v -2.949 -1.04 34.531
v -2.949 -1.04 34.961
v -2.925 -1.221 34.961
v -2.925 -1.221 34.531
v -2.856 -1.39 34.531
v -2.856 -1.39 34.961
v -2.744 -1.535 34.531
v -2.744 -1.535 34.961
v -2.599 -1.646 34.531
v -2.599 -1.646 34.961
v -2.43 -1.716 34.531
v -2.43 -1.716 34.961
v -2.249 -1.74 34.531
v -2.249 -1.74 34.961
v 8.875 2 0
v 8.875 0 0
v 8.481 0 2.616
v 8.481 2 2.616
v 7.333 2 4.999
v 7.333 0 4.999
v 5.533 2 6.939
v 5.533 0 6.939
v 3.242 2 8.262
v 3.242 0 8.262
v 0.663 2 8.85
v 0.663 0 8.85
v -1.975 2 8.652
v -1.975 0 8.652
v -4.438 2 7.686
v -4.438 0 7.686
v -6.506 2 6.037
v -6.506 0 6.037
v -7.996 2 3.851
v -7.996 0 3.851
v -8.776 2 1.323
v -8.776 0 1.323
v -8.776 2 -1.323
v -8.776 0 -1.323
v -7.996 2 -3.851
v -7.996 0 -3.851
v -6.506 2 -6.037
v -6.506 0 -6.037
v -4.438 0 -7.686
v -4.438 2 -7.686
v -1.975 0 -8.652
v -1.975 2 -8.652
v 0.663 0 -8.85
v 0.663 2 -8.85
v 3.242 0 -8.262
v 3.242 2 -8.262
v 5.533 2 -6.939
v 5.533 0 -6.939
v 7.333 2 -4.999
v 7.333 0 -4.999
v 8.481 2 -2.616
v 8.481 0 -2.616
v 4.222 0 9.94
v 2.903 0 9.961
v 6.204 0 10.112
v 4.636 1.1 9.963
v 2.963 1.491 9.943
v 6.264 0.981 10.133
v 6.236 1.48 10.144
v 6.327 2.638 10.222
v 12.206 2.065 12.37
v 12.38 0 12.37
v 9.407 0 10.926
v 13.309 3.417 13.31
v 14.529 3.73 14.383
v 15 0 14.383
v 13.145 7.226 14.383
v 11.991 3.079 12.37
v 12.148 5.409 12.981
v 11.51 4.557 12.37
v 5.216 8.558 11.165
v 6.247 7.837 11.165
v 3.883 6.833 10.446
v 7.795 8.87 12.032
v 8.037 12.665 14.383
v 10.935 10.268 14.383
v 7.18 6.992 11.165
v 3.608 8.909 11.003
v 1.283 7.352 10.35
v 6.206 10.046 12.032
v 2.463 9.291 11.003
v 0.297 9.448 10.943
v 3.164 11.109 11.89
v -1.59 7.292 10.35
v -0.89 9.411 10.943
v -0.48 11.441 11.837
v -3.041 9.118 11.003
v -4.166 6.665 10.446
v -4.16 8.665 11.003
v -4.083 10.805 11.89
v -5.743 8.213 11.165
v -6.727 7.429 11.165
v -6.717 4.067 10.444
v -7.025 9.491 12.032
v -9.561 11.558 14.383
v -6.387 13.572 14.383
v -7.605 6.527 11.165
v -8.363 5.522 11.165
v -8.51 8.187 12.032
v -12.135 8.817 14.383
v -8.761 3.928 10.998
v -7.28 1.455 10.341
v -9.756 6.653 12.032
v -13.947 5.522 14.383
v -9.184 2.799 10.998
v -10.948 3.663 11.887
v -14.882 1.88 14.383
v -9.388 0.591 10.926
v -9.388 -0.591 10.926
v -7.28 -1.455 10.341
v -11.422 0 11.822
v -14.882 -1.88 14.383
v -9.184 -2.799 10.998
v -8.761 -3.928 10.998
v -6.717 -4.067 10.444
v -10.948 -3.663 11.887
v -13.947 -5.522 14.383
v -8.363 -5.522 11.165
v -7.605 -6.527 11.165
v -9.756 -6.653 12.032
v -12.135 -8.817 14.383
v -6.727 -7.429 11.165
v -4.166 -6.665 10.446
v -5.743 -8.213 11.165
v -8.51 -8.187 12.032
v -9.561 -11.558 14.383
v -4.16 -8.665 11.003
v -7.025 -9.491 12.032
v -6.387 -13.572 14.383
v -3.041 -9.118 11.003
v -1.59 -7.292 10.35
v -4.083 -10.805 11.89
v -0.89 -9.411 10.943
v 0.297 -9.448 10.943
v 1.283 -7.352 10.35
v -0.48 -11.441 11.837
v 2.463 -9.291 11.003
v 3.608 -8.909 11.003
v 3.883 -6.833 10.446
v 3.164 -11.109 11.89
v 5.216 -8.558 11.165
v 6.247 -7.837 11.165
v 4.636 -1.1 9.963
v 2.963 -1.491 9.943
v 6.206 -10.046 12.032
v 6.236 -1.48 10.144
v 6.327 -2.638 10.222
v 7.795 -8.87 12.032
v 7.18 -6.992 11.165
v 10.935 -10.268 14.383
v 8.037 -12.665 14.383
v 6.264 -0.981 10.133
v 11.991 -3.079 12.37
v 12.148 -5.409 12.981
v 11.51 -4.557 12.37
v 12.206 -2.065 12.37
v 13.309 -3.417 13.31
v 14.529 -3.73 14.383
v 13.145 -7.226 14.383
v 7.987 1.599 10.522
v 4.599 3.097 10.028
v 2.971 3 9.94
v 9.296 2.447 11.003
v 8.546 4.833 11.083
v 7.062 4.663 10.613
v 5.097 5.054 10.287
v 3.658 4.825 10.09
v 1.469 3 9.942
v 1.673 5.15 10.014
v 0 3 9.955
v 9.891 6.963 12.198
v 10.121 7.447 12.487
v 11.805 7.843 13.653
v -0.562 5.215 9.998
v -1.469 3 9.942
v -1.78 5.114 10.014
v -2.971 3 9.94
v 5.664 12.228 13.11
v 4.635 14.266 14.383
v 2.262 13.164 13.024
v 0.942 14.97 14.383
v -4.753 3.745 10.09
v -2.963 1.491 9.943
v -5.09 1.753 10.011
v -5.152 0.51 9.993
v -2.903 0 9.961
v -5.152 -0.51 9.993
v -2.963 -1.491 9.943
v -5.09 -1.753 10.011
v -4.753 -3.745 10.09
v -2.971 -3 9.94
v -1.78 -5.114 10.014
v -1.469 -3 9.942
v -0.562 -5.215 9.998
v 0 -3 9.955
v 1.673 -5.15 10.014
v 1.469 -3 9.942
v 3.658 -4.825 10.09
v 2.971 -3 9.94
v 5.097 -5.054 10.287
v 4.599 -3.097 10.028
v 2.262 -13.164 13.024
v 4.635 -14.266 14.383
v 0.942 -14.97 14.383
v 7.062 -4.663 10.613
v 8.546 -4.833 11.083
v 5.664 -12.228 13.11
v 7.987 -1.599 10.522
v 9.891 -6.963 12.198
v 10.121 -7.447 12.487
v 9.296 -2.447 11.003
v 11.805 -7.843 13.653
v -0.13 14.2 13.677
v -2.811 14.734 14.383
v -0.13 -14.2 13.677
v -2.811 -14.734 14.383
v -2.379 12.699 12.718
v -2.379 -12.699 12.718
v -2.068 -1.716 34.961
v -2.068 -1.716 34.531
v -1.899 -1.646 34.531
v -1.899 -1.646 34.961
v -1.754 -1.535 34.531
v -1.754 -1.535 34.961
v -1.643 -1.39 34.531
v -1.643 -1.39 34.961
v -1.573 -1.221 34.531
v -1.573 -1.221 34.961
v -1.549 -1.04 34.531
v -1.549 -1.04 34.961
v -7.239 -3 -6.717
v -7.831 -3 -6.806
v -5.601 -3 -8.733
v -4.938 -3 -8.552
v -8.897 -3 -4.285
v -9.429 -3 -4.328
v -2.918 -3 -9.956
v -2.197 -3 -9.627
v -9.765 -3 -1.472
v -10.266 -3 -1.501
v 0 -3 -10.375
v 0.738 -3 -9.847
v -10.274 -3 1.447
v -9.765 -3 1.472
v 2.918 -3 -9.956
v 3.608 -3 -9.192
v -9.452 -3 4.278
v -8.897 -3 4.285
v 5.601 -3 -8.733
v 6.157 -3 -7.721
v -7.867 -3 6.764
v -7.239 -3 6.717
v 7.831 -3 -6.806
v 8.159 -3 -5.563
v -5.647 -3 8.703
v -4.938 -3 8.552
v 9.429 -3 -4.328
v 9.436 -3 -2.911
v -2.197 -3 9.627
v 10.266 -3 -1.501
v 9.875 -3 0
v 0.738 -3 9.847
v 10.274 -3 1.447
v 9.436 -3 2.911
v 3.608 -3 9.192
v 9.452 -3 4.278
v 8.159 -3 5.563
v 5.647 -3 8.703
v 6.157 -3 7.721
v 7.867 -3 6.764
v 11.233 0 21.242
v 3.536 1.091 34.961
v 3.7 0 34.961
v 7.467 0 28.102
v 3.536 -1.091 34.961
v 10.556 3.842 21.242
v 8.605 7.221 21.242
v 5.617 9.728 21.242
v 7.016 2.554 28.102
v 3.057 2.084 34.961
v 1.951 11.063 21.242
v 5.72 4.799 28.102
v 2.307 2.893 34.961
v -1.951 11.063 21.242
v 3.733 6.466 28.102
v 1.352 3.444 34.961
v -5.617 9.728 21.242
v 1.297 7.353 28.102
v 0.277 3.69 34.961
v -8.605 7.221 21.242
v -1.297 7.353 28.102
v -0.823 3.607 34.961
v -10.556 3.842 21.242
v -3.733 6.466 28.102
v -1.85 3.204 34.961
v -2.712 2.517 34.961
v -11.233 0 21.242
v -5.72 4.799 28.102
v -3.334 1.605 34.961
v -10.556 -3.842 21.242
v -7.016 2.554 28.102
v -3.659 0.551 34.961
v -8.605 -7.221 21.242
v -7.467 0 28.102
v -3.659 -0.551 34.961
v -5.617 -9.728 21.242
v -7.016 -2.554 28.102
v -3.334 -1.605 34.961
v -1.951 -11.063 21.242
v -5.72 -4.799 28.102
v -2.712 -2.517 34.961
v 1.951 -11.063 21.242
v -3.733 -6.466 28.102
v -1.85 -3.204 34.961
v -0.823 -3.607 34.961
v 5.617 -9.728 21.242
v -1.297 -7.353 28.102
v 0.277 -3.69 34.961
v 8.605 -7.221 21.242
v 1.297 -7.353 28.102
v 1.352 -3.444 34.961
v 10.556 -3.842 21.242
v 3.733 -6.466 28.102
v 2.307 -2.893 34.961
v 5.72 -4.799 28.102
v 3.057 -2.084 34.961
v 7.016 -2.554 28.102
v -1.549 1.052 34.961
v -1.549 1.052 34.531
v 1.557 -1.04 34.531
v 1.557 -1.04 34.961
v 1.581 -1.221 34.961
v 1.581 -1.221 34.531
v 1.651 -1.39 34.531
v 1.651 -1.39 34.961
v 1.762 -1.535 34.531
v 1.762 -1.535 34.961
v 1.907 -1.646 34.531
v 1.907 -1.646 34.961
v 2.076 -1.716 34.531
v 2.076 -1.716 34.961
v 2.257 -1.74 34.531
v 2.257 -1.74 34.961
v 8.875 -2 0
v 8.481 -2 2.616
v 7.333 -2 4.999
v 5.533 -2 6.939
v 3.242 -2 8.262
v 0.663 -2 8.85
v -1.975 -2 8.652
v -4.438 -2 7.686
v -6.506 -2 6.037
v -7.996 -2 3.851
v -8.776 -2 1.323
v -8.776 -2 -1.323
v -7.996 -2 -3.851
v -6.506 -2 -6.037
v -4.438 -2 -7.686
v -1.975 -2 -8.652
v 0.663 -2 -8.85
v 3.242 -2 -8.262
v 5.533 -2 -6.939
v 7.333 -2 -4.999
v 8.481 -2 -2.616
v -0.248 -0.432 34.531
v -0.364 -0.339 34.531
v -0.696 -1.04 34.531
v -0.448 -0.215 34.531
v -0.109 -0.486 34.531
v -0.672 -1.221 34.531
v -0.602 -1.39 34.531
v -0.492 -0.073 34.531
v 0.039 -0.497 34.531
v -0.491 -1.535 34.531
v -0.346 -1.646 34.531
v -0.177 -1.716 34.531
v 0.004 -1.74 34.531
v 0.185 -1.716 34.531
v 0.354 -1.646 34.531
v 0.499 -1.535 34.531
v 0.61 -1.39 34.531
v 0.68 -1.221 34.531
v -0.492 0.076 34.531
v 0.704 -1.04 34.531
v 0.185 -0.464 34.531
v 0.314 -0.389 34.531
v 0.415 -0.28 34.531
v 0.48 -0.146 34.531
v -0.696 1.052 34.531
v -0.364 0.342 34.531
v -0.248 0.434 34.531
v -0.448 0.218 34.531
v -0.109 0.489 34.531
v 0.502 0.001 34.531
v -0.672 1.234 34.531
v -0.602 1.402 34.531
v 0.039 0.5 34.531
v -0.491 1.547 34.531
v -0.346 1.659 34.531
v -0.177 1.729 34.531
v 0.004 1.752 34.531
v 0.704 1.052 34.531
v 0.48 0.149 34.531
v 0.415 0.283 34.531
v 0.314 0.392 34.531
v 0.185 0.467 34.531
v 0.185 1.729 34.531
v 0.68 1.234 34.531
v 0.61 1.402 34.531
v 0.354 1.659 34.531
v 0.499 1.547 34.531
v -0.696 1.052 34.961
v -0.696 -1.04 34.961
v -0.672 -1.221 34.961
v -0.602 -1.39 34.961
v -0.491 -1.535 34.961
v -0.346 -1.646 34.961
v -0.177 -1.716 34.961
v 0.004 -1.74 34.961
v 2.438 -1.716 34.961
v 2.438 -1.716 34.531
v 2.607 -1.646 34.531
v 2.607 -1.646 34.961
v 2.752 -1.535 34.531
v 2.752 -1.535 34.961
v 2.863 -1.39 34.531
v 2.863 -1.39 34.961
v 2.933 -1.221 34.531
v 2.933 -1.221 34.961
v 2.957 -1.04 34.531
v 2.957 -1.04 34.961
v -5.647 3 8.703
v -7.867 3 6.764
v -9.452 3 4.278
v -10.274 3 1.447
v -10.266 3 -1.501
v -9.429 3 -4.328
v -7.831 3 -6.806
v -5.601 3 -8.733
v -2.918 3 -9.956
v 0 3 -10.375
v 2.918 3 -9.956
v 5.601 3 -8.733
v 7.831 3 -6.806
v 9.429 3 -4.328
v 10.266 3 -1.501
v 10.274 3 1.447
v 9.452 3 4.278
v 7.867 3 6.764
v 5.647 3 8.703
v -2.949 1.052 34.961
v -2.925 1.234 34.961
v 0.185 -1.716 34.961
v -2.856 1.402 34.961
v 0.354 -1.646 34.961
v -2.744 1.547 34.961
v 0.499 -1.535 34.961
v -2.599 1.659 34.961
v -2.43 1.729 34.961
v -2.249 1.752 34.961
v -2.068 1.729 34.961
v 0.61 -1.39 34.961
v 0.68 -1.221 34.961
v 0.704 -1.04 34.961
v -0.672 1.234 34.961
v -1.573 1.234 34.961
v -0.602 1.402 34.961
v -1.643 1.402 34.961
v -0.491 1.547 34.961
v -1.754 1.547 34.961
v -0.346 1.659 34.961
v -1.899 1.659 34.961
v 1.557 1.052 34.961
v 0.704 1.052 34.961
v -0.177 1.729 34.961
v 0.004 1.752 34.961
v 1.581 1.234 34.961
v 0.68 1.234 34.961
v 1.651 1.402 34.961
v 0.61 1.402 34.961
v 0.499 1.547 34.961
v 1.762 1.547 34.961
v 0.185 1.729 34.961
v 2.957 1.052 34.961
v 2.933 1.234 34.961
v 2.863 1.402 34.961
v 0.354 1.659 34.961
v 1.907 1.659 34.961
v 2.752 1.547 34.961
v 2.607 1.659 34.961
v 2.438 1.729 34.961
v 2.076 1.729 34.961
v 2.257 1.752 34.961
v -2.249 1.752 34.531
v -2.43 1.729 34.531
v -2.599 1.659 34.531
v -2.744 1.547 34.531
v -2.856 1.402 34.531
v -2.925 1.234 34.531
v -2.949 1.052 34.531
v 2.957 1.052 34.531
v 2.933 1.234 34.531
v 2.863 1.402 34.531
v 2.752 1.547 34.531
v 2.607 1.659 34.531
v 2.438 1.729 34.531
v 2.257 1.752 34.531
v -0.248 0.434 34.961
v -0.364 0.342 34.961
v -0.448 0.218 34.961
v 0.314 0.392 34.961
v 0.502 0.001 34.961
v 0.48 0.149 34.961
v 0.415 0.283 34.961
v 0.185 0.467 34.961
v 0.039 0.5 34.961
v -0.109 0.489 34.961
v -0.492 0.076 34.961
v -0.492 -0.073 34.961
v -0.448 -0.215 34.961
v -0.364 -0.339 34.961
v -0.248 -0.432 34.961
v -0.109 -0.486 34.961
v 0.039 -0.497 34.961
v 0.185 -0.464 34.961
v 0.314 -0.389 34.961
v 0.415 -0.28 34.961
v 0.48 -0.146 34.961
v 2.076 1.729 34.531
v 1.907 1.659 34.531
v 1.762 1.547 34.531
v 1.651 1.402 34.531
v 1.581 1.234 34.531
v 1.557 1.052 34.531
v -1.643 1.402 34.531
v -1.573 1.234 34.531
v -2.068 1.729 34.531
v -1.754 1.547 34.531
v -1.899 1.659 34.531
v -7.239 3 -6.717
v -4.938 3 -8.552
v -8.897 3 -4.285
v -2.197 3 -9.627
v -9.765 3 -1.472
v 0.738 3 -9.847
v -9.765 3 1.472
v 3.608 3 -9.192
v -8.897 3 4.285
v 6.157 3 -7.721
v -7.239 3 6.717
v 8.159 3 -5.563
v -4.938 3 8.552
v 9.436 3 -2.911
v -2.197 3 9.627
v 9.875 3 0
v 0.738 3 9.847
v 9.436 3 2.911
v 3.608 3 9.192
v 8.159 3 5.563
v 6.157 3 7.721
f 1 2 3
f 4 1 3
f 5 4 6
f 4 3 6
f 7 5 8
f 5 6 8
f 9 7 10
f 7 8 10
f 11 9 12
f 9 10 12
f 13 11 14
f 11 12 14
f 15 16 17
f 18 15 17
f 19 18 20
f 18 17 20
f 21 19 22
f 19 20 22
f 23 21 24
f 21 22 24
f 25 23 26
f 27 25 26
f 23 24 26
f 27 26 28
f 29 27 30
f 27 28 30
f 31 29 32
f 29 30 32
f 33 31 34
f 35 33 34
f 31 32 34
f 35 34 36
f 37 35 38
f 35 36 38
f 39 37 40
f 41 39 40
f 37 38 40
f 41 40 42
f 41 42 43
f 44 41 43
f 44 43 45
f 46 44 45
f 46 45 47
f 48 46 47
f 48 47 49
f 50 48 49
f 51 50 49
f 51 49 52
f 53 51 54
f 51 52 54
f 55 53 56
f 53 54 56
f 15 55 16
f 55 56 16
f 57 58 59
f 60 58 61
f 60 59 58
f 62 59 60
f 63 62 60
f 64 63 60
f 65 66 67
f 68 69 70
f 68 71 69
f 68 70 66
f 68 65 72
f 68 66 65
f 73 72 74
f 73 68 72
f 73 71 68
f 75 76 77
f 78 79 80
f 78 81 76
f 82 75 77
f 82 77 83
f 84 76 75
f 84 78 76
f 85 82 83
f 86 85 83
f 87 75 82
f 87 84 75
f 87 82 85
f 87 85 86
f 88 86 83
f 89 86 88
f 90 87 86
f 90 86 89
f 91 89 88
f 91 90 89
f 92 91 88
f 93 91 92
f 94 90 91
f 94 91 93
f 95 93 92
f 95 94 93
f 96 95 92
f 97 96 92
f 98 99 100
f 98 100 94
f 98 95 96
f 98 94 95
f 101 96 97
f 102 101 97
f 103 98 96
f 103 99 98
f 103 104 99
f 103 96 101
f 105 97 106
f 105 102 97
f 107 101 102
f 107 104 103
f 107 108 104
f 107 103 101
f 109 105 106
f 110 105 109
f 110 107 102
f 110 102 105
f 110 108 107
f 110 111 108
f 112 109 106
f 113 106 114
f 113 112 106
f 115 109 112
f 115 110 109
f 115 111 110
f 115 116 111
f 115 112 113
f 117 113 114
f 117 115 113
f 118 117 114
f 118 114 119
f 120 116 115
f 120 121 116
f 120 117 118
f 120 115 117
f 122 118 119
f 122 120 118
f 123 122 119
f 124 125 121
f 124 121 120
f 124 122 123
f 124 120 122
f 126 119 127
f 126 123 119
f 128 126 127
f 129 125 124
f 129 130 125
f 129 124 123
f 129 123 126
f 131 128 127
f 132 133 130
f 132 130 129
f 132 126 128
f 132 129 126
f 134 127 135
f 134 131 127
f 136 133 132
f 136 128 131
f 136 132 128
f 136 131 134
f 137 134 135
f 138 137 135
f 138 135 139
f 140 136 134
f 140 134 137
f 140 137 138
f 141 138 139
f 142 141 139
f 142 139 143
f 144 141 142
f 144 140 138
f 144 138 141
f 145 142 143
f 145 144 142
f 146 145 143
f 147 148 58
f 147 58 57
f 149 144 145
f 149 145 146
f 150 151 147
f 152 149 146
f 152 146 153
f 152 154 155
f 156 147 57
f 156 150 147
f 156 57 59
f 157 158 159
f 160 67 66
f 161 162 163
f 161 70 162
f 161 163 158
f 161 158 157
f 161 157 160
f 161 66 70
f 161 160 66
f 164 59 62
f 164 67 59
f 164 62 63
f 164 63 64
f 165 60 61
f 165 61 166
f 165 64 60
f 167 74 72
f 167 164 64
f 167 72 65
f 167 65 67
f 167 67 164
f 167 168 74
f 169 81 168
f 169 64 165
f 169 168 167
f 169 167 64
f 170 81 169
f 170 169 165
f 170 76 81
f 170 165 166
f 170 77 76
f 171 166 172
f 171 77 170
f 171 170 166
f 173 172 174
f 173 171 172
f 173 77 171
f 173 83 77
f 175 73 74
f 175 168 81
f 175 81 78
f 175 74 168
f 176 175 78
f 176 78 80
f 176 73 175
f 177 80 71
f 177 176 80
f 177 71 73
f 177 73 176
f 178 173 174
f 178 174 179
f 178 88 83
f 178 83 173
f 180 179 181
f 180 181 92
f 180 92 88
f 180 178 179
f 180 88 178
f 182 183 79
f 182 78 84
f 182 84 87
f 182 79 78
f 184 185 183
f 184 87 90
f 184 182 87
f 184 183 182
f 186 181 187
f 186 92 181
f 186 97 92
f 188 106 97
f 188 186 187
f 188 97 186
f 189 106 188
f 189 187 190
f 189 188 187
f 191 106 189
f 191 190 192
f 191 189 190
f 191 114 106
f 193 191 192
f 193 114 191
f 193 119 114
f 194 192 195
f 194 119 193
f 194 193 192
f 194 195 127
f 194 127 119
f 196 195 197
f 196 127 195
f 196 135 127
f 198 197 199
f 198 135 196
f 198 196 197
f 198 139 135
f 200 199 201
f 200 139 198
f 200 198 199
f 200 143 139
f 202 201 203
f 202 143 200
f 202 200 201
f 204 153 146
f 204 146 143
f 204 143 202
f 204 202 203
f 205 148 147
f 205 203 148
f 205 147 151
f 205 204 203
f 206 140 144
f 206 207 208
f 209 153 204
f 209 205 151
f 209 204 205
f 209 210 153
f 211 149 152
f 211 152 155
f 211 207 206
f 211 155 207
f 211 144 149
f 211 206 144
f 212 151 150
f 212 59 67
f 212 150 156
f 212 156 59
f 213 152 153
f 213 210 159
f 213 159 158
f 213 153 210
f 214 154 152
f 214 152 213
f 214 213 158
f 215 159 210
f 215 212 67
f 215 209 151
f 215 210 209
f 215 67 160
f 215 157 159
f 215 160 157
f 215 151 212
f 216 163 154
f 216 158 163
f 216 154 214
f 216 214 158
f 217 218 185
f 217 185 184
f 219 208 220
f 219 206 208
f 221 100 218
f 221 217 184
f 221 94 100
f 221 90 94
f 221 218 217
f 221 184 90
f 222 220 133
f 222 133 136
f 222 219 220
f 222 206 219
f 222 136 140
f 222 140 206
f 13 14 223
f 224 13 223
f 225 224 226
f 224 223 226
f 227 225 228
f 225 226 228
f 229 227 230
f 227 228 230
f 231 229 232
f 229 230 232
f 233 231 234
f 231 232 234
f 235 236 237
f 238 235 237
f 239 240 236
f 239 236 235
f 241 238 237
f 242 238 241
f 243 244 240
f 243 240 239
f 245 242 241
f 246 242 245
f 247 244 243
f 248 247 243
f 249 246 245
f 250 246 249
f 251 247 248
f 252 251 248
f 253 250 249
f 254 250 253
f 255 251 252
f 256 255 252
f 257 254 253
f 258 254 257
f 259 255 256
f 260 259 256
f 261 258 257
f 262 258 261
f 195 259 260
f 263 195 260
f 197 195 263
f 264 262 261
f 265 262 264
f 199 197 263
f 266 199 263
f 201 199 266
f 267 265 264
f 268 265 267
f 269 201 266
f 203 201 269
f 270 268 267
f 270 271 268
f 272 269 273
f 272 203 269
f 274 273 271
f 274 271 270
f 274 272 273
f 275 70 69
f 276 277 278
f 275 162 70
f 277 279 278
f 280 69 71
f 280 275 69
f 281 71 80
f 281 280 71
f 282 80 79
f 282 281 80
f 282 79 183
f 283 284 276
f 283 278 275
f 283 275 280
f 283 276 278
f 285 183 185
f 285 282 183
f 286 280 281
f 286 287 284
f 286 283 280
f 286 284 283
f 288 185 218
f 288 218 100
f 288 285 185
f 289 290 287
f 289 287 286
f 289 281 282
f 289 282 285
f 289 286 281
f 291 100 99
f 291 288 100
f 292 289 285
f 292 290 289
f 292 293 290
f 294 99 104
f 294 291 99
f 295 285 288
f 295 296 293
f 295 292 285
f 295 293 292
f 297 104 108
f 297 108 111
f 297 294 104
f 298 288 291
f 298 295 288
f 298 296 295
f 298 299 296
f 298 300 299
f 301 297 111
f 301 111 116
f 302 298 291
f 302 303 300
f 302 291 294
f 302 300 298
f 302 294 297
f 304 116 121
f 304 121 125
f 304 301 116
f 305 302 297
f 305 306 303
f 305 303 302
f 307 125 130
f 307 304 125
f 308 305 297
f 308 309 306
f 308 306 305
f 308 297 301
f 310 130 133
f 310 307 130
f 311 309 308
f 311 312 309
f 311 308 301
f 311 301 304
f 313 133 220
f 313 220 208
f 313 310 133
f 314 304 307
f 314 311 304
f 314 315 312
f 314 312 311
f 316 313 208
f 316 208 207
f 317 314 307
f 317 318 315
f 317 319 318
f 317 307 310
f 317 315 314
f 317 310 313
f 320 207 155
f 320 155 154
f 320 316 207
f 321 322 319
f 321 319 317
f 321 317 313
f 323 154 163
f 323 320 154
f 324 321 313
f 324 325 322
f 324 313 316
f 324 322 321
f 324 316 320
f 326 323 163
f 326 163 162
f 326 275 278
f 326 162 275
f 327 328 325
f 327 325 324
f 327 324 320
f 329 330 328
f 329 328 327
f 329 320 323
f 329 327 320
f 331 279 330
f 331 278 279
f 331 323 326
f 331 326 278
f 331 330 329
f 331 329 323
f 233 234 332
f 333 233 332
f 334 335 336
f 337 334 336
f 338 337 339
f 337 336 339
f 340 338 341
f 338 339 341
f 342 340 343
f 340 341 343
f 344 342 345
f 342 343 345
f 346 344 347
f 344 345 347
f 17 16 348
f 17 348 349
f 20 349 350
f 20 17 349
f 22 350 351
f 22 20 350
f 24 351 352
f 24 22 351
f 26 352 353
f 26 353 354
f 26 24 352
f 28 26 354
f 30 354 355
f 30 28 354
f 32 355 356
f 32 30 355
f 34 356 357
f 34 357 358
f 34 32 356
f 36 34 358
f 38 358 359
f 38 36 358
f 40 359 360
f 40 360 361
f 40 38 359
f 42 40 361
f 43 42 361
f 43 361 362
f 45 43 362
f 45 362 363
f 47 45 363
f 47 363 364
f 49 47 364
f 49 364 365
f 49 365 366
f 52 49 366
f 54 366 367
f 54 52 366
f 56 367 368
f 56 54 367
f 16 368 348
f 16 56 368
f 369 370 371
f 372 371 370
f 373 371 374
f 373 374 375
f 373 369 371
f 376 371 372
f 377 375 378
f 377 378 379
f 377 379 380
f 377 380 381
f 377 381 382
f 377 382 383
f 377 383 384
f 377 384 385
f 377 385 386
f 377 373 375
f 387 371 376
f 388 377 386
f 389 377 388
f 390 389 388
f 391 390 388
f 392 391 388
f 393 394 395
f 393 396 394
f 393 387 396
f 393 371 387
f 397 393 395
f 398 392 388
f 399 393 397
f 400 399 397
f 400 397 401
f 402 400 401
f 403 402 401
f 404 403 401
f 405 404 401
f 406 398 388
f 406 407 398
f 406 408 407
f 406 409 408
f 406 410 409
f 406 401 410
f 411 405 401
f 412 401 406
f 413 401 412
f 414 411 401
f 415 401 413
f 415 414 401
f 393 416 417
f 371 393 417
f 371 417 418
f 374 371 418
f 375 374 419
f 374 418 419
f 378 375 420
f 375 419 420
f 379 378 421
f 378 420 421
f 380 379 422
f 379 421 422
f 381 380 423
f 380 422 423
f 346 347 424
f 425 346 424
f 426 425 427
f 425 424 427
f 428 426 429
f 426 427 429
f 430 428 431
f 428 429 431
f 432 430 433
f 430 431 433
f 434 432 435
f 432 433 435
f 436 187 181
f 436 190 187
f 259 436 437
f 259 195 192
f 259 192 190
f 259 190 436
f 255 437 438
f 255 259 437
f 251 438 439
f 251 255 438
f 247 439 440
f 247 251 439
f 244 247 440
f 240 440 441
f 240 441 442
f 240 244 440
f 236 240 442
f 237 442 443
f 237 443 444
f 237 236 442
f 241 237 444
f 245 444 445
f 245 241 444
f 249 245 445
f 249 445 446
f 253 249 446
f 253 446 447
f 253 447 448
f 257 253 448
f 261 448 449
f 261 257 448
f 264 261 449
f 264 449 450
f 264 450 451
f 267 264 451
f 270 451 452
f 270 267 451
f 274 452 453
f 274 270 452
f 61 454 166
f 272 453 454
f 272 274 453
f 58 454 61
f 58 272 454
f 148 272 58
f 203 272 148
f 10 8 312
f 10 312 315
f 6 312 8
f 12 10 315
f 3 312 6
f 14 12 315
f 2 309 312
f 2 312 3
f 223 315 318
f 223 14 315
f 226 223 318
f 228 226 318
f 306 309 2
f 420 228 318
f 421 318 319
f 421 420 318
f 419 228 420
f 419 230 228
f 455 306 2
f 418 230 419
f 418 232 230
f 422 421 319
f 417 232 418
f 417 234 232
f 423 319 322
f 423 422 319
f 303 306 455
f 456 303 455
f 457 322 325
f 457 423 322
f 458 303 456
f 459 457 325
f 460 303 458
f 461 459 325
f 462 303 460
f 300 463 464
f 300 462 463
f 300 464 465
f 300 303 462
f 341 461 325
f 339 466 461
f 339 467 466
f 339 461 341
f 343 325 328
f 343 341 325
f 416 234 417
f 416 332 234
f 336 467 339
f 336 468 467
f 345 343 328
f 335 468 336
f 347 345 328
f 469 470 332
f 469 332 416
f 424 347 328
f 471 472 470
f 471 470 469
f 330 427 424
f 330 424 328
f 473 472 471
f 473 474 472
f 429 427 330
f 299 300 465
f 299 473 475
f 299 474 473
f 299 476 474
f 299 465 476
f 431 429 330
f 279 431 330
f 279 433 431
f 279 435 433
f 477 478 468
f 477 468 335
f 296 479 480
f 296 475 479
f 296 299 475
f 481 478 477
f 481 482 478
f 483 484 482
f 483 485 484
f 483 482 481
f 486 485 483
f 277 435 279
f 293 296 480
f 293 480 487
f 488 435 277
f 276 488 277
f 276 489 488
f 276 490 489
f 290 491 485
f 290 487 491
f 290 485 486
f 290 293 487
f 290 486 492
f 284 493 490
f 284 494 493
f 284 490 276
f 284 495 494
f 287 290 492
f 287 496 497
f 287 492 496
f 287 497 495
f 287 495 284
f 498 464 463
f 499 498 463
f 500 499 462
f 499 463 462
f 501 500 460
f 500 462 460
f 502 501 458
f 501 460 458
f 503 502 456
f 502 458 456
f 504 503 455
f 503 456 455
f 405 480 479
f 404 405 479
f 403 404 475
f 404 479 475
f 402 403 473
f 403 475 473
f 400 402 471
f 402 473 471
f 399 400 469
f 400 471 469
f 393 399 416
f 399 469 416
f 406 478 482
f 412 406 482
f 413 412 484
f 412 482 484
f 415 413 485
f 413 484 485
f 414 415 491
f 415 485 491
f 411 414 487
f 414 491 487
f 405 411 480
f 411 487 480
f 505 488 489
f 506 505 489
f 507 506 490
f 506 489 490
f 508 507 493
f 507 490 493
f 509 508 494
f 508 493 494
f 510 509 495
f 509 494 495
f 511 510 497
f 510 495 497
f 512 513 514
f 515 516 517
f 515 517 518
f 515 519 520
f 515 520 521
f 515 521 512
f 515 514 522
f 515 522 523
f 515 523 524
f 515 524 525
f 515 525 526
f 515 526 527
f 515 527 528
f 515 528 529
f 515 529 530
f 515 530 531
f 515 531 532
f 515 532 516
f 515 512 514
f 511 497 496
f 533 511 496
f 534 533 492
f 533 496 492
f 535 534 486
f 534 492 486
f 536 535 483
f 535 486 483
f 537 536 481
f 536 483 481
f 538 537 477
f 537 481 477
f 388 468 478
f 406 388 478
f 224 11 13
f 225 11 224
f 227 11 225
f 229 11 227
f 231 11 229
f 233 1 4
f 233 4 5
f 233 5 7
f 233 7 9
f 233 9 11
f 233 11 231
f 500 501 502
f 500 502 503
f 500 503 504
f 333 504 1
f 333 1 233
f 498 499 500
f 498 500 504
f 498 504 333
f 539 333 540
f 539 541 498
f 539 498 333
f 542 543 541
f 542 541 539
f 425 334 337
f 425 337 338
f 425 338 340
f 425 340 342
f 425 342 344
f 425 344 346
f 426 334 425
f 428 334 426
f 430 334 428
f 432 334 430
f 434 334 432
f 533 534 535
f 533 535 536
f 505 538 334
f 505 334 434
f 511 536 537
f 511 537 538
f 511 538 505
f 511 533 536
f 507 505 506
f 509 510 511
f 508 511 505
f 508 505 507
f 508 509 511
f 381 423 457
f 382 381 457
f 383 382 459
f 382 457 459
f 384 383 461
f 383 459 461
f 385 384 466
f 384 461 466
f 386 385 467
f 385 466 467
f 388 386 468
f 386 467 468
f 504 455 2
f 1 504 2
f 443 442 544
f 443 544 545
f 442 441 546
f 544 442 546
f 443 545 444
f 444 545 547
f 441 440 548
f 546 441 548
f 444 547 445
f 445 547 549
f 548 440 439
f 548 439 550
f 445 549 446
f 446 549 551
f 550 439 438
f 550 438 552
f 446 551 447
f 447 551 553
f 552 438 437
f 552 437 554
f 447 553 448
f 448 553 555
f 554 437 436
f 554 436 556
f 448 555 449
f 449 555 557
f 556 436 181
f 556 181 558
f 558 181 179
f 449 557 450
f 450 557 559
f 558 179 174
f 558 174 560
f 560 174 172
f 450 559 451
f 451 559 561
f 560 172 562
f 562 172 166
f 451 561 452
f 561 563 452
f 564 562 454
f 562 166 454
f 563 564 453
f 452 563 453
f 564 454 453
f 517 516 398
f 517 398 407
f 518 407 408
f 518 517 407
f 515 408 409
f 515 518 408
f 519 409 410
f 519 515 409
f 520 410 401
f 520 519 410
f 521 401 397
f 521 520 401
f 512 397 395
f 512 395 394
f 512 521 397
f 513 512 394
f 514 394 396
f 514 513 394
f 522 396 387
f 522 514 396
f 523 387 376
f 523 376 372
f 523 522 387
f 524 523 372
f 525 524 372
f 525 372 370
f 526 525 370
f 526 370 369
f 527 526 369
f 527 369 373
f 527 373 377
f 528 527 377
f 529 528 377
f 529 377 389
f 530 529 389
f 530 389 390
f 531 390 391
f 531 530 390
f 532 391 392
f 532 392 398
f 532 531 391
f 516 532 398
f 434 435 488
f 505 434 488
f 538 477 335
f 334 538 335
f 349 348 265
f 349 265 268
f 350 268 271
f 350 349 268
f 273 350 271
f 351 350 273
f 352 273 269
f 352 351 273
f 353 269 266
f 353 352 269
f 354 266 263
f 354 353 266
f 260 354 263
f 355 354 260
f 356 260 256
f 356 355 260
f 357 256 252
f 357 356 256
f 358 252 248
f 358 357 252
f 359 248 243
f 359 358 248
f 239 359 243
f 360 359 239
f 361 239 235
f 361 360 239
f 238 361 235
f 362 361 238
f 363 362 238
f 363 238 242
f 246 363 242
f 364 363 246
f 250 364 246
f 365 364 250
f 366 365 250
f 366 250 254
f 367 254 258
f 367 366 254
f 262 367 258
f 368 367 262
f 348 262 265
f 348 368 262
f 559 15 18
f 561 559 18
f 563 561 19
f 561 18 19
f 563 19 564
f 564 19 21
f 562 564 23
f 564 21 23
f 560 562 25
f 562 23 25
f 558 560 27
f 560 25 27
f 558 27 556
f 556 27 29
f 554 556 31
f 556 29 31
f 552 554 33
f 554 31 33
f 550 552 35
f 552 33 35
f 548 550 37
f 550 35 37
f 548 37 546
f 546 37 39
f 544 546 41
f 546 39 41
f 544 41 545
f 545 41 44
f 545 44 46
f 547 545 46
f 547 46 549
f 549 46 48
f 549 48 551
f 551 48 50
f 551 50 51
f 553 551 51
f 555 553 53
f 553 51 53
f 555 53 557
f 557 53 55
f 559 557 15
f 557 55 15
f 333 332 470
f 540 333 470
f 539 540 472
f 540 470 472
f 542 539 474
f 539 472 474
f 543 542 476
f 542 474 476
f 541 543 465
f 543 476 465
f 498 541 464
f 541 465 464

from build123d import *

# Parameters (mm, degrees)
F0_R          = 8.875
F3_DEPTH      = 3
F3_DEPTH_BACK = 3
F4_SIZE       = 1
F5_R          = 0.5
F6_DEPTH      = 0.43


with BuildPart() as f2:
    # F0 (on Front) → F2 (revolve)
    with BuildSketch(Plane.XZ):
        with BuildLine():
            ThreePointArc((0, 10.375), (1.4661242569, 10.2708862647), (2.9028232275, 9.9606346339))
            ThreePointArc((2.9028232275, 9.9606346339), (9.4069705736, 10.9259285589), (15, 14.3833476682))
            Line((15, 14.3833476682), (3.7, 34.9606346339))
            Line((3.7, 34.9606346339), (0, 34.9606346339))
            Line((0, 34.9606346339), (0, 10.375))
        make_face()
    revolve(axis=Axis((0, 0, 0), (0, 0, 1)))

    # F0 (on Front) → F3 (join, two sides)
    with BuildSketch(Plane.XZ) as f3_sk:
        with BuildLine():
            ThreePointArc((0, 10.375), (-7.3362328548, -7.3362328548), (10.375, 0))
            ThreePointArc((10.375, 0), (8.2993197307, 6.2259069225), (2.9028232275, 9.9606346339))
            Line((2.9028232275, 9.9606346339), (0, 9.9606346339))
            Line((0, 9.9606346339), (0, 10.375))
        make_face()
        Circle(F0_R, mode=Mode.SUBTRACT)
        with BuildLine():
            Line((0, 9.9606346339), (2.9028232275, 9.9606346339))
            ThreePointArc((2.9028232275, 9.9606346339), (1.4661242569, 10.2708862647), (0, 10.375))
            Line((0, 10.375), (0, 9.9606346339))
        make_face()
    extrude(amount=F3_DEPTH)
    extrude(f3_sk.sketch, amount=-F3_DEPTH_BACK)

    # F4
    f4_edges = [f2.edges().sort_by_distance(p)[0] for p in [
        (-8.875, -3, 0),
        (-8.875, 3, 0),
    ]]
    chamfer(f4_edges, length=F4_SIZE)

    # F5 (on face) → F6 (cut)
    with BuildSketch(Plane.XY.offset(34.9606346339)):
        with BuildLine():
            ThreePointArc((0.0041443855, 1.7524251654), (-0.4908303614, 1.5473999123), (-0.6958556145, 1.0524251654))
            Line((-0.6958556145, 1.0524251654), (-0.6958556145, -1.0399995122))
            ThreePointArc((-0.6958556145, -1.0399995122), (-0.4908303614, -1.534974259), (0.0041443855, -1.7399995122))
            ThreePointArc((0.0041443855, -1.7399995122), (0.4991191323, -1.534974259), (0.7041443855, -1.0399995122))
            Line((0.7041443855, -1.0399995122), (0.7041443855, 1.0524251654))
            ThreePointArc((0.7041443855, 1.0524251654), (0.4991191323, 1.5473999123), (0.0041443855, 1.7524251654))
        make_face()
        with Locations((0.0021327037, 0.0014704808)):
            Circle(F5_R, mode=Mode.SUBTRACT)
        with BuildLine():
            ThreePointArc((-2.2493049037, 1.7524251654), (-2.7442796505, 1.5473999123), (-2.9493049037, 1.0524251654))
            Line((-2.9493049037, 1.0524251654), (-2.9493049037, -1.0399995122))
            ThreePointArc((-2.9493049037, -1.0399995122), (-2.7442796505, -1.534974259), (-2.2493049037, -1.7399995122))
            ThreePointArc((-2.2493049037, -1.7399995122), (-1.7543301568, -1.534974259), (-1.5493049037, -1.0399995122))
            Line((-1.5493049037, -1.0399995122), (-1.5493049037, 1.0524251654))
            ThreePointArc((-1.5493049037, 1.0524251654), (-1.7543301568, 1.5473999123), (-2.2493049037, 1.7524251654))
        make_face()
        with BuildLine():
            ThreePointArc((2.2571443855, 1.7524251654), (1.7621696386, 1.5473999123), (1.5571443855, 1.0524251654))
            Line((1.5571443855, 1.0524251654), (1.5571443855, -1.0399995122))
            ThreePointArc((1.5571443855, -1.0399995122), (1.7621696386, -1.534974259), (2.2571443855, -1.7399995122))
            ThreePointArc((2.2571443855, -1.7399995122), (2.7521191323, -1.534974259), (2.9571443855, -1.0399995122))
            Line((2.9571443855, -1.0399995122), (2.9571443855, 1.0524251654))
            ThreePointArc((2.9571443855, 1.0524251654), (2.7521191323, 1.5473999123), (2.2571443855, 1.7524251654))
        make_face()
    extrude(amount=-F6_DEPTH, mode=Mode.SUBTRACT)


solid = f2.part
